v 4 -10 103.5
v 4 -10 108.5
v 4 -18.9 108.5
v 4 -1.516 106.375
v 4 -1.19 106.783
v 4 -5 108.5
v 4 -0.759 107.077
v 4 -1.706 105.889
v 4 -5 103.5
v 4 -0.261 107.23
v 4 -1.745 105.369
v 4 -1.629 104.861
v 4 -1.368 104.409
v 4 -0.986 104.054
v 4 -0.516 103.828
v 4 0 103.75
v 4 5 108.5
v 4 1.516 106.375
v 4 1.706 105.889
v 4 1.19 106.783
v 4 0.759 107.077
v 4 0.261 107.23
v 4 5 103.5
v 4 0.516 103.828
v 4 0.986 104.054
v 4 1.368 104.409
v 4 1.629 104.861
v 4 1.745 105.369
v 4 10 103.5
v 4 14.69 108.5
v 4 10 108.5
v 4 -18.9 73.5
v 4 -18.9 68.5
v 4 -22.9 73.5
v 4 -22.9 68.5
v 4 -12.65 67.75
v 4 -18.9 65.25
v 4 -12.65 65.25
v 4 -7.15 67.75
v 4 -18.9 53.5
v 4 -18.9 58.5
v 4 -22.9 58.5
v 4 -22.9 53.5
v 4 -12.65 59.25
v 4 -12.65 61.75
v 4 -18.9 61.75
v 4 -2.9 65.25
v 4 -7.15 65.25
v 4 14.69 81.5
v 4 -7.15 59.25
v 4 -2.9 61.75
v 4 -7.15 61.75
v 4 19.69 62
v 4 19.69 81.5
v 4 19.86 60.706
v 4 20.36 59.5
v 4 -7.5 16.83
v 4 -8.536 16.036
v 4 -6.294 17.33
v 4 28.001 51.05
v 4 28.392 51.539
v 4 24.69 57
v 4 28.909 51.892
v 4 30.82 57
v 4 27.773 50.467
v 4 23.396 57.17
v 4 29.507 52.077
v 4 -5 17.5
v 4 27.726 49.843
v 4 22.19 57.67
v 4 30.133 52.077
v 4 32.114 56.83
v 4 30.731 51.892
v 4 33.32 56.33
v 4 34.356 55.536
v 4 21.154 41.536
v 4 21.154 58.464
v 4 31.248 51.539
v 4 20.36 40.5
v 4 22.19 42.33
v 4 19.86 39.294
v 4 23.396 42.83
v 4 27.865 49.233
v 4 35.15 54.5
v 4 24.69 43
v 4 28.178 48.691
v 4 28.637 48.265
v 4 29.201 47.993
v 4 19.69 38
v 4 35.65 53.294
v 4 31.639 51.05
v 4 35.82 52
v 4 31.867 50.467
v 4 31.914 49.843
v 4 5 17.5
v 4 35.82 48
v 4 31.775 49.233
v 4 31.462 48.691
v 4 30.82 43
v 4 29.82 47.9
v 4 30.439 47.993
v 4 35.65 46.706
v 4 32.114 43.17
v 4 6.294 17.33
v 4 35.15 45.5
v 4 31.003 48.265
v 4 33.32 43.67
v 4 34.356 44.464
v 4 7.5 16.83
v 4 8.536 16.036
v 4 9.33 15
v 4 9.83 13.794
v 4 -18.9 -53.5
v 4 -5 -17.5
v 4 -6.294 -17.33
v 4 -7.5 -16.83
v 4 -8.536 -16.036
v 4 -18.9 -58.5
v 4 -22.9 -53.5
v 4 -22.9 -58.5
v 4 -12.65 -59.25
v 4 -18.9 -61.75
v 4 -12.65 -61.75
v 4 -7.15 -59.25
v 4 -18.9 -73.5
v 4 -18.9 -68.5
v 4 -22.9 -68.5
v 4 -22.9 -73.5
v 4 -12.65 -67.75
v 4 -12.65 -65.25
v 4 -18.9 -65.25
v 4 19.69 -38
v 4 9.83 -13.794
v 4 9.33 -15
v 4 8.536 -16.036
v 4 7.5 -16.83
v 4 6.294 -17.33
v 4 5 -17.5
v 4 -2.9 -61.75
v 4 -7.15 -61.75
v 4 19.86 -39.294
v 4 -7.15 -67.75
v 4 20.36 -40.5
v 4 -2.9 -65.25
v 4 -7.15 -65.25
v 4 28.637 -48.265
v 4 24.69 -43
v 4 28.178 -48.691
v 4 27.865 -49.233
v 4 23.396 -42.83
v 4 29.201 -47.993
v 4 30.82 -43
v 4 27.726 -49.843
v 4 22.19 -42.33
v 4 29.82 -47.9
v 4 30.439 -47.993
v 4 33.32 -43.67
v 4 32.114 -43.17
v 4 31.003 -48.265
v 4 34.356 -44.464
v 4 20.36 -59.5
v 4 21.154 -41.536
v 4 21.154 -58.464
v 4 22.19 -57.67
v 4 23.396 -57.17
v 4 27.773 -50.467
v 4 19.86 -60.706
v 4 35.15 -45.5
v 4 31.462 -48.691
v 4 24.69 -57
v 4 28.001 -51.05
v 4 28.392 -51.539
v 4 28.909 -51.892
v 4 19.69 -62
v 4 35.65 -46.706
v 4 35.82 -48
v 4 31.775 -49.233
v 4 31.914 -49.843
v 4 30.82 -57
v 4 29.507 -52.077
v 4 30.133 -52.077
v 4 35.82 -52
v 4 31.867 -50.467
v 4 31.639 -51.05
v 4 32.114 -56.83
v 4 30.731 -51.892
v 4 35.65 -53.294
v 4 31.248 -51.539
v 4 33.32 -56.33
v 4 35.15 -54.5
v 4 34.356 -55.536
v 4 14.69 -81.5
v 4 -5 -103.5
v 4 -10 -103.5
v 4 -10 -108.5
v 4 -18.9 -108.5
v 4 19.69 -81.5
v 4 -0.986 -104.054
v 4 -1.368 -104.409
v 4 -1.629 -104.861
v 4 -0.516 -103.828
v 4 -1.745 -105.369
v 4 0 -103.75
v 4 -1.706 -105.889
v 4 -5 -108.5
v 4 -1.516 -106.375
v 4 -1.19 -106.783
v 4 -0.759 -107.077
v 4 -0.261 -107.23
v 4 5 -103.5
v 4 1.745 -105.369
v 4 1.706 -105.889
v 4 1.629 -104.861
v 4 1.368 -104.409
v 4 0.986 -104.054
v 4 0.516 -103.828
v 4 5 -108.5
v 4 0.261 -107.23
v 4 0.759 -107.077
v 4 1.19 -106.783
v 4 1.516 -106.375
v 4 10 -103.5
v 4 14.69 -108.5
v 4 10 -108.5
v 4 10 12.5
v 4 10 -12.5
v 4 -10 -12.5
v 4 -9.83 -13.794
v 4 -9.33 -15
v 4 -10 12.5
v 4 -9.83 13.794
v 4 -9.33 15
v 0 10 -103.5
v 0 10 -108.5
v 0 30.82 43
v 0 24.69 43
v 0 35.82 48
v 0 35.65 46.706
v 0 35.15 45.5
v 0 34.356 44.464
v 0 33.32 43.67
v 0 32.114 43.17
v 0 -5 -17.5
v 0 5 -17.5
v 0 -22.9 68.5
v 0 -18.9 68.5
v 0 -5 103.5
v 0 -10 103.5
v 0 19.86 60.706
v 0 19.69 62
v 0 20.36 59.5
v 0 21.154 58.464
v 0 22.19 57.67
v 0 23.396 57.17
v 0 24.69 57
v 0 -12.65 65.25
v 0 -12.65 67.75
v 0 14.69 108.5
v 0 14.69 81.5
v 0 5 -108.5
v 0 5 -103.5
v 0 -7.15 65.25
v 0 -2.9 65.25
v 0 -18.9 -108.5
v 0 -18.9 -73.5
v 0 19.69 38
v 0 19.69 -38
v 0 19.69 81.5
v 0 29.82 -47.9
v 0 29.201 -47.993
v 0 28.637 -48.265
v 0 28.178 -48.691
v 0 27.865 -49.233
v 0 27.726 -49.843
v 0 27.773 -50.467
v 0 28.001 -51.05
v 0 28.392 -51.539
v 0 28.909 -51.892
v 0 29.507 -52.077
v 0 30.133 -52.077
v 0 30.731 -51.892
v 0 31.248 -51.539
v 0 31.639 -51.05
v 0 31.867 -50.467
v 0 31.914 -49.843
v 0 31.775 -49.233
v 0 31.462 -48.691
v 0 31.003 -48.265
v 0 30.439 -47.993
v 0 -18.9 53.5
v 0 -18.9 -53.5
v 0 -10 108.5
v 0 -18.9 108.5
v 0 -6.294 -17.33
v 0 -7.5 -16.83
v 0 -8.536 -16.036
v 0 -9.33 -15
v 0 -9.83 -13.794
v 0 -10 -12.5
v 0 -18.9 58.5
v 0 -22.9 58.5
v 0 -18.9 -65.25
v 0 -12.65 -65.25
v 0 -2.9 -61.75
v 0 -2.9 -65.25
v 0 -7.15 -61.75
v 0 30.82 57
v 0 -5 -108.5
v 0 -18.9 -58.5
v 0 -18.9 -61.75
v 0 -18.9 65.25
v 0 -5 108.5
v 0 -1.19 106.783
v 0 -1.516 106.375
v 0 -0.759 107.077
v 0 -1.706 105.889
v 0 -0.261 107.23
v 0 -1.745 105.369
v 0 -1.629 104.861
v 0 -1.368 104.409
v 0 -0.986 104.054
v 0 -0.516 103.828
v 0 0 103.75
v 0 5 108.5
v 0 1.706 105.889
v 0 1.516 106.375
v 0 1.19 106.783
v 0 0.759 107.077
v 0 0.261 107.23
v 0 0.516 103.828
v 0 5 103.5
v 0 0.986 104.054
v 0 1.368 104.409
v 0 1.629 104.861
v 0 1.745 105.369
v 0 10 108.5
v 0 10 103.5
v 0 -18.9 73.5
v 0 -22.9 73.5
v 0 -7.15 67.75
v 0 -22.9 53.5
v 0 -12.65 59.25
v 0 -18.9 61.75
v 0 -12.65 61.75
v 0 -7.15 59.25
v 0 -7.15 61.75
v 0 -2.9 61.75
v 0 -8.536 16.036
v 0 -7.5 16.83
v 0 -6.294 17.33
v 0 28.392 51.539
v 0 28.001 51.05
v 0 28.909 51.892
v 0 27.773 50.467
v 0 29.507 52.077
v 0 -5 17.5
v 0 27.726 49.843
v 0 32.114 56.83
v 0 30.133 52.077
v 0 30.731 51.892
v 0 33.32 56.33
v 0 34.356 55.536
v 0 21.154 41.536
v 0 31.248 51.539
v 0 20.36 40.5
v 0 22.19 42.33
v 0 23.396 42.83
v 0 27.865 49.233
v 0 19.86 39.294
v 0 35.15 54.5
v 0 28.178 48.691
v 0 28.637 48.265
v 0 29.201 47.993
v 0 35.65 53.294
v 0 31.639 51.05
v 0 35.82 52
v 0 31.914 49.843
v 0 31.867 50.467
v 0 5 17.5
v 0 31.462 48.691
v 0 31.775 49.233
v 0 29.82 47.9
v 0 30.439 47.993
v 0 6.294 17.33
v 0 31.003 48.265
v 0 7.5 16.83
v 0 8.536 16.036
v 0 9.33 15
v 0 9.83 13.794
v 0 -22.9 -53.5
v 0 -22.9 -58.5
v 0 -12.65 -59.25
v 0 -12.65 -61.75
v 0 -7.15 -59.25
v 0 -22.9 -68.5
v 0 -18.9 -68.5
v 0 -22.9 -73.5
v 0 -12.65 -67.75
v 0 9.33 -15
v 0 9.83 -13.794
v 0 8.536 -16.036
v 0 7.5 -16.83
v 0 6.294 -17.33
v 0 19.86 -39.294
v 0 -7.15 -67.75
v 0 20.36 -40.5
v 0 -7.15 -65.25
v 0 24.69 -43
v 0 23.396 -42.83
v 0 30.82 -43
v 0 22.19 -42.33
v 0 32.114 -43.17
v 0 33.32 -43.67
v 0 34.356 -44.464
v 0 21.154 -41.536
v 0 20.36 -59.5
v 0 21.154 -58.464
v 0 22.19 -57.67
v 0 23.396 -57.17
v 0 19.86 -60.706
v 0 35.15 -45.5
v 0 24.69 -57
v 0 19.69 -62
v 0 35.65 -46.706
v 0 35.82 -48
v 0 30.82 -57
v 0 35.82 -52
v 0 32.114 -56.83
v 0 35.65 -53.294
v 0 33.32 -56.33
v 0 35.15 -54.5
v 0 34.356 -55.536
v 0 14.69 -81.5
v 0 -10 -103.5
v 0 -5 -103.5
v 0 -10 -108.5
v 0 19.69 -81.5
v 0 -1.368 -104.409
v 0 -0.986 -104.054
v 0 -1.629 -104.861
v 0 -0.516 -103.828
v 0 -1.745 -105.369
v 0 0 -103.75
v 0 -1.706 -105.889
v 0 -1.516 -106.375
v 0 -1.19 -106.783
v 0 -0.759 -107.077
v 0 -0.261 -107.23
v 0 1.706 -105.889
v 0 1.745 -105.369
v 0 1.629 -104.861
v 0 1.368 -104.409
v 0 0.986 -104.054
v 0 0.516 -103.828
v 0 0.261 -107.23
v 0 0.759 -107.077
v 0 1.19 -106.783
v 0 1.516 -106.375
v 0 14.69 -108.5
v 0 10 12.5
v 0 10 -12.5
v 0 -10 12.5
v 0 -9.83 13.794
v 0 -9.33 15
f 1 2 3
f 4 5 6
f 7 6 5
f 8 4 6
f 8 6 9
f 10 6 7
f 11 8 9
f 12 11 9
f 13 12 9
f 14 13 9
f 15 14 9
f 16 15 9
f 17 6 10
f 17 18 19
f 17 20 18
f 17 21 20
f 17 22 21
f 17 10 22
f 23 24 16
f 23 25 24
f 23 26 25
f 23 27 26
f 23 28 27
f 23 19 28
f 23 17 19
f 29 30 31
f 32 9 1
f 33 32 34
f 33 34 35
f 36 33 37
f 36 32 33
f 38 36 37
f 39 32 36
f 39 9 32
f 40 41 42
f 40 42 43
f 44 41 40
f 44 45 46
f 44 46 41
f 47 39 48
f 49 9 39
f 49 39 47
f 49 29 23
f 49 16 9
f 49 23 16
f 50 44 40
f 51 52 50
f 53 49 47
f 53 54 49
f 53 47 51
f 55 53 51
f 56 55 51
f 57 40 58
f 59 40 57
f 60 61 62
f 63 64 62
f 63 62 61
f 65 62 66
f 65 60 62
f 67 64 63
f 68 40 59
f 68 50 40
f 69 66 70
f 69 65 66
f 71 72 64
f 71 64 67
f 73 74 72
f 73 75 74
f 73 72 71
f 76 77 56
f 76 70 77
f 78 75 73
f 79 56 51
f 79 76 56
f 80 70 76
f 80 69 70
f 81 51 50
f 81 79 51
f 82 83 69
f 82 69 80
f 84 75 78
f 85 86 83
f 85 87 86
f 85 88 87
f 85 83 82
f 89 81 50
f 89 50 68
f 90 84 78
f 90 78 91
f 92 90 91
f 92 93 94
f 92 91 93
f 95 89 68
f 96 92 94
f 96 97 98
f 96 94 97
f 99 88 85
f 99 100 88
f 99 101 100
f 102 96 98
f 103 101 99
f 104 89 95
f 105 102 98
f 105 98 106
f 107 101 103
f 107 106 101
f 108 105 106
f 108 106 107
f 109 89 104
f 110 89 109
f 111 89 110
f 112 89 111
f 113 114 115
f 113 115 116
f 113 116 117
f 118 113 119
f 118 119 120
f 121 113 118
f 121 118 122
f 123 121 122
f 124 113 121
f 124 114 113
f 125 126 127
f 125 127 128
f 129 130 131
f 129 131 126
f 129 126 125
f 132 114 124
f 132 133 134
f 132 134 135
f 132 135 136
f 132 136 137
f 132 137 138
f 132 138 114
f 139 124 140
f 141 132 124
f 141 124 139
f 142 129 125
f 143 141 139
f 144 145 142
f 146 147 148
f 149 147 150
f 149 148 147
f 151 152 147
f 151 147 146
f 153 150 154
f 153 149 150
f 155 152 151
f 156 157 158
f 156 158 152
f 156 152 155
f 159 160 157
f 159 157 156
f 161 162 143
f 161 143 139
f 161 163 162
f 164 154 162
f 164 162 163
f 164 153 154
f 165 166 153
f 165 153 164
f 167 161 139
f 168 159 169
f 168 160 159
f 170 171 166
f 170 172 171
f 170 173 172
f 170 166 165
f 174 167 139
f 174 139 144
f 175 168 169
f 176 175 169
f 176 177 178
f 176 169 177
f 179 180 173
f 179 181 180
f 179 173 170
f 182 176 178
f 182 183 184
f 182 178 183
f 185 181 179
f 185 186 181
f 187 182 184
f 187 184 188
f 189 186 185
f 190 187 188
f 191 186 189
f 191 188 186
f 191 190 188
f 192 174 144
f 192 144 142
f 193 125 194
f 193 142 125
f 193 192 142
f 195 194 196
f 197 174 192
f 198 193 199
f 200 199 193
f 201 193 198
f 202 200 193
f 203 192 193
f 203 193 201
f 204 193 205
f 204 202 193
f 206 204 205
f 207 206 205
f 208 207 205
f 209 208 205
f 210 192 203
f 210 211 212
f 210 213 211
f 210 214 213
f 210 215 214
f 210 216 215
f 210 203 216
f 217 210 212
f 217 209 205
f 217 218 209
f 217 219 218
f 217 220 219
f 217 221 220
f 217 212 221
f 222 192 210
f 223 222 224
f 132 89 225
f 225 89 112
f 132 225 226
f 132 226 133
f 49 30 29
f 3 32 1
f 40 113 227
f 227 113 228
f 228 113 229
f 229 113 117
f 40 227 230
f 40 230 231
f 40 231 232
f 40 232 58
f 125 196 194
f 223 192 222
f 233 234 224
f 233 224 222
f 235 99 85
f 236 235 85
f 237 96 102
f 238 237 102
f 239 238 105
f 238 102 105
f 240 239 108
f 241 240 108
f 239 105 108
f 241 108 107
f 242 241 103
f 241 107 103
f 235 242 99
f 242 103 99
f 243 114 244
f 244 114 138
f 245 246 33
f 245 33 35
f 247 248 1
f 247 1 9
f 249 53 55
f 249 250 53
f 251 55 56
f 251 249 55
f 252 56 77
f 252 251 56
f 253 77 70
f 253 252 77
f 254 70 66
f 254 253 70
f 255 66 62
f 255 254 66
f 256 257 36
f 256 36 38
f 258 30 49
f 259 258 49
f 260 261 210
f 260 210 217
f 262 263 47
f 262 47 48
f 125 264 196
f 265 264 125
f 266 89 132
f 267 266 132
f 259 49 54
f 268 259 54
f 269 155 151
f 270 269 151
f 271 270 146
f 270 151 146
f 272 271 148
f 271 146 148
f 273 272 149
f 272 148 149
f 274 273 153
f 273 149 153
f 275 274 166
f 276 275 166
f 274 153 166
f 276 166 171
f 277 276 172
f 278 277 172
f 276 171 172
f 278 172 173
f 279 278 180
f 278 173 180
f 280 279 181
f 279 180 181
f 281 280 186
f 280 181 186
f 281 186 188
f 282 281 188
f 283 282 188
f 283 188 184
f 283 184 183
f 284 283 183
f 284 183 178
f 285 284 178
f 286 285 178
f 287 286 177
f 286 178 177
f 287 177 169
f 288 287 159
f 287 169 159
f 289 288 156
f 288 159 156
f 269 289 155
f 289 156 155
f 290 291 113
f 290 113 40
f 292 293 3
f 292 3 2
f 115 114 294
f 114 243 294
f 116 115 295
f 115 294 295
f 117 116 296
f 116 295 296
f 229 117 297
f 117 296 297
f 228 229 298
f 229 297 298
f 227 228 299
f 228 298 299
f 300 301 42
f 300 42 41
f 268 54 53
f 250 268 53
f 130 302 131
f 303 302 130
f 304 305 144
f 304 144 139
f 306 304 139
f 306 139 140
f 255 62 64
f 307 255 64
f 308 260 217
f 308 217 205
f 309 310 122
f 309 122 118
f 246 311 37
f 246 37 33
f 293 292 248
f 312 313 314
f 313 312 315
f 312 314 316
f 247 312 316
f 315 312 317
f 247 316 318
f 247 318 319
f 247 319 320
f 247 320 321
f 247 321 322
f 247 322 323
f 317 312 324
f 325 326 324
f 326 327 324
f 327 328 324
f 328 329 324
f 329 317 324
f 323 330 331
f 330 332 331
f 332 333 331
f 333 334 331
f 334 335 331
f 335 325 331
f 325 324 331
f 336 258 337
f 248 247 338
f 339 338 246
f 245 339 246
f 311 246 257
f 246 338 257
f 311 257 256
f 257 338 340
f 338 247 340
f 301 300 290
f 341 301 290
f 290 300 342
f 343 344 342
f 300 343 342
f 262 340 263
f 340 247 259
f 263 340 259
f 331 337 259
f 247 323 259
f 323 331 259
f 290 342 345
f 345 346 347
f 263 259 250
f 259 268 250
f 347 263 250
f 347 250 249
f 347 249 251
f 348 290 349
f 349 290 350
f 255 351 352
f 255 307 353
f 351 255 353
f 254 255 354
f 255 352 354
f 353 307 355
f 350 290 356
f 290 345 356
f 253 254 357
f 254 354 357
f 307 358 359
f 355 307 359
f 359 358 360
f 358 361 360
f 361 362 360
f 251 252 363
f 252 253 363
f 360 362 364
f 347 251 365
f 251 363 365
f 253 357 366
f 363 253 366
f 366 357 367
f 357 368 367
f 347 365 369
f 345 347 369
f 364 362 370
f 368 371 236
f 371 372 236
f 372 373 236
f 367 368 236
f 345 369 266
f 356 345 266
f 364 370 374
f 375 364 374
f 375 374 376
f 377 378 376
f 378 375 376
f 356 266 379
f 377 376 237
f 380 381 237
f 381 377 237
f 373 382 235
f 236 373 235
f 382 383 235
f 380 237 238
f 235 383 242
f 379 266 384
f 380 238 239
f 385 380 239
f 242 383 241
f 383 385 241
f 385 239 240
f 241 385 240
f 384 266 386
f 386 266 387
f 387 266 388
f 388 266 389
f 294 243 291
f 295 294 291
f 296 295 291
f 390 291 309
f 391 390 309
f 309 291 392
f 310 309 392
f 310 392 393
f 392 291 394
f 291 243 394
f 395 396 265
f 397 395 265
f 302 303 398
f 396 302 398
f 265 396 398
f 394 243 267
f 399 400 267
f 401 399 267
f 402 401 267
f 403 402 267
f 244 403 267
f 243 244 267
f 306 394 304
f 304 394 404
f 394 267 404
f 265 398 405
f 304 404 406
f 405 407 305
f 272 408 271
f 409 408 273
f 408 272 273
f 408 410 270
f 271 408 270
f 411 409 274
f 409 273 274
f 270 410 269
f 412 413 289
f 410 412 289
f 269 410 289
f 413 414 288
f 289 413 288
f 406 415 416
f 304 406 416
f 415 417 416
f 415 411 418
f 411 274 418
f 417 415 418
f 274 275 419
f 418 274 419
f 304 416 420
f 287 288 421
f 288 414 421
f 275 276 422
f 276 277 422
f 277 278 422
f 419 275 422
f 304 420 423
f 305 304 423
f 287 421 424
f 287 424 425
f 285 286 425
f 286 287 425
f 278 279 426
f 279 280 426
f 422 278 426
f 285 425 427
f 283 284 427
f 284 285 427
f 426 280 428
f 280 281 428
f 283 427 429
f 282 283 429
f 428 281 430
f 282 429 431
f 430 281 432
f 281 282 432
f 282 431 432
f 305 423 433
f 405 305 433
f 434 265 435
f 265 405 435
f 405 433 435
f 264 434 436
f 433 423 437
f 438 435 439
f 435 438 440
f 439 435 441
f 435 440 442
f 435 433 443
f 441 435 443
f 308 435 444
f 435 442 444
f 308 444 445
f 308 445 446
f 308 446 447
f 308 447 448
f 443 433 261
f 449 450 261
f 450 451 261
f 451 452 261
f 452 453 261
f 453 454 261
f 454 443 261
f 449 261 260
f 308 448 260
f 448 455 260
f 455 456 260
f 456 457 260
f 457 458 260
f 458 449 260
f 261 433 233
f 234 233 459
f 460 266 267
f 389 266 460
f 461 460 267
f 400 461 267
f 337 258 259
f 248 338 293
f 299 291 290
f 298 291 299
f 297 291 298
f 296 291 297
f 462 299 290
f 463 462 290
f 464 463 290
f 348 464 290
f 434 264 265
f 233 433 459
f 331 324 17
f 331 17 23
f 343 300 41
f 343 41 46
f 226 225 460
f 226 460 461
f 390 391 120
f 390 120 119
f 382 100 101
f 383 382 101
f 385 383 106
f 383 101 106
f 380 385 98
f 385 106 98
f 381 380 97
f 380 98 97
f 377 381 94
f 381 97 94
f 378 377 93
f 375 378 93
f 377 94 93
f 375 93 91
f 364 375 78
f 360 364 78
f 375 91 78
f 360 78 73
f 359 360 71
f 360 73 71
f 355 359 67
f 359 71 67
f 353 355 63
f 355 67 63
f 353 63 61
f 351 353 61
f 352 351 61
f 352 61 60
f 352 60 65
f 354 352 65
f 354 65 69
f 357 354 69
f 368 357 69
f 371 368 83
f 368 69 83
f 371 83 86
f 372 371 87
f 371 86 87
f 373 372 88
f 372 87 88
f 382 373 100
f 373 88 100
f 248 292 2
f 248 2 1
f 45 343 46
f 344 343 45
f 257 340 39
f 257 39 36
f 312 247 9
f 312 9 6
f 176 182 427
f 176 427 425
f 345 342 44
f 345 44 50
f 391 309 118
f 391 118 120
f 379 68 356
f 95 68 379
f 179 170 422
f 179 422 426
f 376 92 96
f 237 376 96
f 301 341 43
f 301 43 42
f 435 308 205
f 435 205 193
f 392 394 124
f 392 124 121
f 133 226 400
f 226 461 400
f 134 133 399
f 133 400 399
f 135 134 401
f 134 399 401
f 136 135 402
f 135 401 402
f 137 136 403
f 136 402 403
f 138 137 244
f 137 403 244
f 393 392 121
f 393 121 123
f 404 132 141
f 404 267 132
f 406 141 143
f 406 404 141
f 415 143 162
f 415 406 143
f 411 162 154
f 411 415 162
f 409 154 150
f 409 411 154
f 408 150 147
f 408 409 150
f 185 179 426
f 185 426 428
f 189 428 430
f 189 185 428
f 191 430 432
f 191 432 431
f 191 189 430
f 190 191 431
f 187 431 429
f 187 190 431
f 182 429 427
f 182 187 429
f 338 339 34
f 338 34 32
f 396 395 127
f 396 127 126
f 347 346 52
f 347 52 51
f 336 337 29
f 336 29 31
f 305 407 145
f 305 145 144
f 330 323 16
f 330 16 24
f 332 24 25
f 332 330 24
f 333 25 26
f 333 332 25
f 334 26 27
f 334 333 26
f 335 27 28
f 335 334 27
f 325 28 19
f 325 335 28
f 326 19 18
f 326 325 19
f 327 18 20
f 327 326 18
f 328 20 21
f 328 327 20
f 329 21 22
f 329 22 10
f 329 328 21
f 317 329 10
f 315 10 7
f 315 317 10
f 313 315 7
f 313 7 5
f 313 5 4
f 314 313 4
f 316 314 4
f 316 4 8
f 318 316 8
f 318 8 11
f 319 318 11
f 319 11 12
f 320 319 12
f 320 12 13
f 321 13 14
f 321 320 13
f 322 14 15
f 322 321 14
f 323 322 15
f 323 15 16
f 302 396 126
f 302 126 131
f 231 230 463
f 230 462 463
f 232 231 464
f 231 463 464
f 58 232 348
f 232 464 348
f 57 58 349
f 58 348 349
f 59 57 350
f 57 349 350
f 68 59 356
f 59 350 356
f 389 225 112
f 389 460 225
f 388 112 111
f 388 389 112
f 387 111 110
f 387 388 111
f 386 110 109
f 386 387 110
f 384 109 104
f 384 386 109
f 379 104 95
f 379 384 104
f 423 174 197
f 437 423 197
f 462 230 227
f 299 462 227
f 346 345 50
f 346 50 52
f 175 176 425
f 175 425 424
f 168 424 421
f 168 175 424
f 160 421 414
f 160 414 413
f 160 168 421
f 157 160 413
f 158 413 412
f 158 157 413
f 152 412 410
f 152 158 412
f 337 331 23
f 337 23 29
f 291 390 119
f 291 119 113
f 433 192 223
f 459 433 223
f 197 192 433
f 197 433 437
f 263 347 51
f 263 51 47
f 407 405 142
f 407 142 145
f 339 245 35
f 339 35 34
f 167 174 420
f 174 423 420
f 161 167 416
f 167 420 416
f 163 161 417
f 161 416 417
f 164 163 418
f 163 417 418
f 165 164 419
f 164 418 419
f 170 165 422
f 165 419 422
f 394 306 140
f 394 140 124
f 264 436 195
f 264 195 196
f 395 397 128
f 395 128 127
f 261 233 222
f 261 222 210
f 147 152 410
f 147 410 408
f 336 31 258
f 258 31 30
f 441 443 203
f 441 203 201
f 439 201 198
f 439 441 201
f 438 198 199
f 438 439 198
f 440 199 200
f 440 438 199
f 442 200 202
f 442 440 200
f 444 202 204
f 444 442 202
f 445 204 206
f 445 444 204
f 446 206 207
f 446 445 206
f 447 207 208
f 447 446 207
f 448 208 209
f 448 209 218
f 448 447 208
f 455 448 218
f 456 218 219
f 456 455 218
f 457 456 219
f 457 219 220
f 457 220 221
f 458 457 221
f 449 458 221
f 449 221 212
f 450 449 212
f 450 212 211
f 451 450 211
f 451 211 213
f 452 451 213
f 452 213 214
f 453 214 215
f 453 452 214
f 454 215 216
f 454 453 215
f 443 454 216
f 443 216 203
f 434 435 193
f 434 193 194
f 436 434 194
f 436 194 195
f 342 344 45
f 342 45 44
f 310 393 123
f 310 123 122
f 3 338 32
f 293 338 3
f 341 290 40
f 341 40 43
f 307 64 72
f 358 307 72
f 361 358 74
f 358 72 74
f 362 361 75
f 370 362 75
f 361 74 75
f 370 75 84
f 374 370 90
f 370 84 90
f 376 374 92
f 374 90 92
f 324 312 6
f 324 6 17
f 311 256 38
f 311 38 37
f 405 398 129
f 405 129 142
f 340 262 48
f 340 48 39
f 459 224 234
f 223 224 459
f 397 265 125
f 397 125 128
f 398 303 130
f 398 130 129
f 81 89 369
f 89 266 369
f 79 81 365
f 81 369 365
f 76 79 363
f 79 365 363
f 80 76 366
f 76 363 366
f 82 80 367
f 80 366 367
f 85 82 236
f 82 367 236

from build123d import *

# Parameters (mm, degrees)
ESBO_O1_R                = 1.75
RESSALTO_EXTRUS_O1_DEPTH = 4
ESBO_O2_W                = 35
ESBO_O2_H                = 20
CORTE_EXTRUS_O1_DEPTH    = 111.962426073
ESBO_O3_W                = 217
ESBO_O3_H                = 1.79
RESSALTO_EXTRUS_O2_DEPTH = 4
ESBO_O4_W                = 27
ESBO_O4_H                = 6
CORTE_EXTRUS_O2_DEPTH    = 111.962426073
ESBO_O5_W                = 163
ESBO_O5_H                = 1
CORTE_EXTRUS_O3_DEPTH    = 111.962426073
ESBO_O6_R                = 2.1
RESSALTO_EXTRUS_O4_DEPTH = 4
FILETE1_R                = 5
FILETE2_R                = 5


with BuildPart() as part:
    # Esboço1 → Ressalto-extrusão1 (new body)
    with BuildSketch(Plane(origin=(0, 0, 0), x_dir=(0, 0, -1), z_dir=(1, 0, 0))):
        Polygon((-108.5, 18.9), (108.5, 18.9), (108.5, 10), (103.5, 10), (103.5, 5), (108.5, 5), (108.5, -5), (103.5, -5), (103.5, -10), (108.5, -10), (108.5, -18.9), (73.5, -18.9), (73.5, -22.9), (68.5, -22.9), (68.5, -18.9), (65.25, -18.9), (65.25, -12.65), (67.75, -12.65), (67.75, -7.15), (65.25, -7.15), (65.25, -2.9), (61.75, -2.9), (61.75, -7.15), (59.25, -7.15), (59.25, -12.65), (61.75, -12.65), (61.75, -18.9), (58.5, -18.9), (58.5, -22.9), (53.5, -22.9), (53.5, -18.9), (-53.5, -18.9), (-53.5, -22.9), (-58.5, -22.9), (-58.5, -18.9), (-61.75, -18.9), (-61.75, -12.65), (-59.25, -12.65), (-59.25, -7.15), (-61.75, -7.15), (-61.75, -2.9), (-65.25, -2.9), (-65.25, -7.15), (-67.75, -7.15), (-67.75, -12.65), (-65.25, -12.65), (-65.25, -18.9), (-68.5, -18.9), (-68.5, -22.9), (-73.5, -22.9), (-73.5, -18.9), (-108.5, -18.9), (-108.5, -10), (-103.5, -10), (-103.5, -5), (-108.5, -5), (-108.5, 5), (-103.5, 5), (-103.5, 10), (-108.5, 10), align=None)
        with Locations((-105.5, 0)):
            Circle(ESBO_O1_R, mode=Mode.SUBTRACT)
        with Locations(Location((105.5, 0, 0), (0, 0, 180))):
            Circle(ESBO_O1_R, mode=Mode.SUBTRACT)
    extrude(amount=RESSALTO_EXTRUS_O1_DEPTH)

    # Esboço2 → Corte-extrusão1 (cut, through all)
    with BuildSketch(Plane(origin=(4, 0, 0), x_dir=(0, 0, -1), z_dir=(1, 0, 0))):
        Rectangle(ESBO_O2_W, ESBO_O2_H)
    extrude(amount=-CORTE_EXTRUS_O1_DEPTH, mode=Mode.SUBTRACT)

    # Esboço3 → Ressalto-extrusão2 (add, through all)
    with BuildSketch(Plane(origin=(4, 0, 0), x_dir=(0, 0, -1), z_dir=(1, 0, 0))):
        with Locations((0, 19.795)):
            Rectangle(ESBO_O3_W, ESBO_O3_H)
    extrude(amount=-RESSALTO_EXTRUS_O2_DEPTH)

    # Esboço4 → Corte-extrusão2 (cut, through all)
    with BuildSketch(Plane(origin=(4, 0, 0), x_dir=(0, 0, -1), z_dir=(1, 0, 0))):
        with Locations((-95, 17.69)):
            Rectangle(ESBO_O4_W, ESBO_O4_H)
        with Locations((95, 17.69)):
            Rectangle(ESBO_O4_W, ESBO_O4_H)
    extrude(amount=-CORTE_EXTRUS_O2_DEPTH, mode=Mode.SUBTRACT)

    # Esboço5 → Corte-extrusão3 (cut, through all)
    with BuildSketch(Plane(origin=(4, 0, 0), x_dir=(0, 0, -1), z_dir=(1, 0, 0))):
        with Locations((0, 20.19)):
            Rectangle(ESBO_O5_W, ESBO_O5_H)
    extrude(amount=-CORTE_EXTRUS_O3_DEPTH, mode=Mode.SUBTRACT)

    # Esboço6 → Ressalto-extrusão4 (add, through all)
    # profile 1 of 2: a face of its own
    with BuildSketch(Plane(origin=(4, 0, 0), x_dir=(0, 0, -1), z_dir=(1, 0, 0))):
        with BuildLine():
            Line((-57, 19.69), (-57, 30.82))
            ThreePointArc((-57, 30.82), (-55.535533906, 34.355533906), (-52, 35.82))
            Line((-52, 35.82), (-48, 35.82))
            ThreePointArc((-48, 35.82), (-44.464466094, 34.355533906), (-43, 30.82))
            Line((-43, 30.82), (-43, 19.69))
            Line((-43, 19.69), (-57, 19.69))
        make_face()
        with Locations((-50, 29.82)):
            Circle(ESBO_O6_R, mode=Mode.SUBTRACT)
    # profile 2 of 2: a face of its own
    with BuildSketch(Plane(origin=(4, 0, 0), x_dir=(0, 0, -1), z_dir=(1, 0, 0))):
        with BuildLine():
            Line((43, 30.82), (43, 19.69))
            Line((43, 19.69), (57, 19.69))
            Line((57, 19.69), (57, 30.82))
            ThreePointArc((57, 30.82), (55.535533906, 34.355533906), (52, 35.82))
            Line((52, 35.82), (48, 35.82))
            ThreePointArc((48, 35.82), (44.464466094, 34.355533906), (43, 30.82))
        make_face()
        with Locations(Location((50, 29.82, 0), (0, 0, 180))):
            Circle(ESBO_O6_R, mode=Mode.SUBTRACT)
    extrude(amount=-RESSALTO_EXTRUS_O4_DEPTH)

    # Filete1
    filete1_edges = [part.edges().sort_by_distance(p)[0] for p in [
        (2, 19.69, 43),
        (2, 19.69, 57),
        (2, 19.69, -57),
        (2, 19.69, -43),
    ]]
    fillet(filete1_edges, radius=FILETE1_R)

    # Filete2
    filete2_edges = [part.edges().sort_by_distance(p)[0] for p in [
        (2, 10, -17.5),
        (2, -10, -17.5),
        (2, -10, 17.5),
        (2, 10, 17.5),
    ]]
    fillet(filete2_edges, radius=FILETE2_R)


solid = part.part
